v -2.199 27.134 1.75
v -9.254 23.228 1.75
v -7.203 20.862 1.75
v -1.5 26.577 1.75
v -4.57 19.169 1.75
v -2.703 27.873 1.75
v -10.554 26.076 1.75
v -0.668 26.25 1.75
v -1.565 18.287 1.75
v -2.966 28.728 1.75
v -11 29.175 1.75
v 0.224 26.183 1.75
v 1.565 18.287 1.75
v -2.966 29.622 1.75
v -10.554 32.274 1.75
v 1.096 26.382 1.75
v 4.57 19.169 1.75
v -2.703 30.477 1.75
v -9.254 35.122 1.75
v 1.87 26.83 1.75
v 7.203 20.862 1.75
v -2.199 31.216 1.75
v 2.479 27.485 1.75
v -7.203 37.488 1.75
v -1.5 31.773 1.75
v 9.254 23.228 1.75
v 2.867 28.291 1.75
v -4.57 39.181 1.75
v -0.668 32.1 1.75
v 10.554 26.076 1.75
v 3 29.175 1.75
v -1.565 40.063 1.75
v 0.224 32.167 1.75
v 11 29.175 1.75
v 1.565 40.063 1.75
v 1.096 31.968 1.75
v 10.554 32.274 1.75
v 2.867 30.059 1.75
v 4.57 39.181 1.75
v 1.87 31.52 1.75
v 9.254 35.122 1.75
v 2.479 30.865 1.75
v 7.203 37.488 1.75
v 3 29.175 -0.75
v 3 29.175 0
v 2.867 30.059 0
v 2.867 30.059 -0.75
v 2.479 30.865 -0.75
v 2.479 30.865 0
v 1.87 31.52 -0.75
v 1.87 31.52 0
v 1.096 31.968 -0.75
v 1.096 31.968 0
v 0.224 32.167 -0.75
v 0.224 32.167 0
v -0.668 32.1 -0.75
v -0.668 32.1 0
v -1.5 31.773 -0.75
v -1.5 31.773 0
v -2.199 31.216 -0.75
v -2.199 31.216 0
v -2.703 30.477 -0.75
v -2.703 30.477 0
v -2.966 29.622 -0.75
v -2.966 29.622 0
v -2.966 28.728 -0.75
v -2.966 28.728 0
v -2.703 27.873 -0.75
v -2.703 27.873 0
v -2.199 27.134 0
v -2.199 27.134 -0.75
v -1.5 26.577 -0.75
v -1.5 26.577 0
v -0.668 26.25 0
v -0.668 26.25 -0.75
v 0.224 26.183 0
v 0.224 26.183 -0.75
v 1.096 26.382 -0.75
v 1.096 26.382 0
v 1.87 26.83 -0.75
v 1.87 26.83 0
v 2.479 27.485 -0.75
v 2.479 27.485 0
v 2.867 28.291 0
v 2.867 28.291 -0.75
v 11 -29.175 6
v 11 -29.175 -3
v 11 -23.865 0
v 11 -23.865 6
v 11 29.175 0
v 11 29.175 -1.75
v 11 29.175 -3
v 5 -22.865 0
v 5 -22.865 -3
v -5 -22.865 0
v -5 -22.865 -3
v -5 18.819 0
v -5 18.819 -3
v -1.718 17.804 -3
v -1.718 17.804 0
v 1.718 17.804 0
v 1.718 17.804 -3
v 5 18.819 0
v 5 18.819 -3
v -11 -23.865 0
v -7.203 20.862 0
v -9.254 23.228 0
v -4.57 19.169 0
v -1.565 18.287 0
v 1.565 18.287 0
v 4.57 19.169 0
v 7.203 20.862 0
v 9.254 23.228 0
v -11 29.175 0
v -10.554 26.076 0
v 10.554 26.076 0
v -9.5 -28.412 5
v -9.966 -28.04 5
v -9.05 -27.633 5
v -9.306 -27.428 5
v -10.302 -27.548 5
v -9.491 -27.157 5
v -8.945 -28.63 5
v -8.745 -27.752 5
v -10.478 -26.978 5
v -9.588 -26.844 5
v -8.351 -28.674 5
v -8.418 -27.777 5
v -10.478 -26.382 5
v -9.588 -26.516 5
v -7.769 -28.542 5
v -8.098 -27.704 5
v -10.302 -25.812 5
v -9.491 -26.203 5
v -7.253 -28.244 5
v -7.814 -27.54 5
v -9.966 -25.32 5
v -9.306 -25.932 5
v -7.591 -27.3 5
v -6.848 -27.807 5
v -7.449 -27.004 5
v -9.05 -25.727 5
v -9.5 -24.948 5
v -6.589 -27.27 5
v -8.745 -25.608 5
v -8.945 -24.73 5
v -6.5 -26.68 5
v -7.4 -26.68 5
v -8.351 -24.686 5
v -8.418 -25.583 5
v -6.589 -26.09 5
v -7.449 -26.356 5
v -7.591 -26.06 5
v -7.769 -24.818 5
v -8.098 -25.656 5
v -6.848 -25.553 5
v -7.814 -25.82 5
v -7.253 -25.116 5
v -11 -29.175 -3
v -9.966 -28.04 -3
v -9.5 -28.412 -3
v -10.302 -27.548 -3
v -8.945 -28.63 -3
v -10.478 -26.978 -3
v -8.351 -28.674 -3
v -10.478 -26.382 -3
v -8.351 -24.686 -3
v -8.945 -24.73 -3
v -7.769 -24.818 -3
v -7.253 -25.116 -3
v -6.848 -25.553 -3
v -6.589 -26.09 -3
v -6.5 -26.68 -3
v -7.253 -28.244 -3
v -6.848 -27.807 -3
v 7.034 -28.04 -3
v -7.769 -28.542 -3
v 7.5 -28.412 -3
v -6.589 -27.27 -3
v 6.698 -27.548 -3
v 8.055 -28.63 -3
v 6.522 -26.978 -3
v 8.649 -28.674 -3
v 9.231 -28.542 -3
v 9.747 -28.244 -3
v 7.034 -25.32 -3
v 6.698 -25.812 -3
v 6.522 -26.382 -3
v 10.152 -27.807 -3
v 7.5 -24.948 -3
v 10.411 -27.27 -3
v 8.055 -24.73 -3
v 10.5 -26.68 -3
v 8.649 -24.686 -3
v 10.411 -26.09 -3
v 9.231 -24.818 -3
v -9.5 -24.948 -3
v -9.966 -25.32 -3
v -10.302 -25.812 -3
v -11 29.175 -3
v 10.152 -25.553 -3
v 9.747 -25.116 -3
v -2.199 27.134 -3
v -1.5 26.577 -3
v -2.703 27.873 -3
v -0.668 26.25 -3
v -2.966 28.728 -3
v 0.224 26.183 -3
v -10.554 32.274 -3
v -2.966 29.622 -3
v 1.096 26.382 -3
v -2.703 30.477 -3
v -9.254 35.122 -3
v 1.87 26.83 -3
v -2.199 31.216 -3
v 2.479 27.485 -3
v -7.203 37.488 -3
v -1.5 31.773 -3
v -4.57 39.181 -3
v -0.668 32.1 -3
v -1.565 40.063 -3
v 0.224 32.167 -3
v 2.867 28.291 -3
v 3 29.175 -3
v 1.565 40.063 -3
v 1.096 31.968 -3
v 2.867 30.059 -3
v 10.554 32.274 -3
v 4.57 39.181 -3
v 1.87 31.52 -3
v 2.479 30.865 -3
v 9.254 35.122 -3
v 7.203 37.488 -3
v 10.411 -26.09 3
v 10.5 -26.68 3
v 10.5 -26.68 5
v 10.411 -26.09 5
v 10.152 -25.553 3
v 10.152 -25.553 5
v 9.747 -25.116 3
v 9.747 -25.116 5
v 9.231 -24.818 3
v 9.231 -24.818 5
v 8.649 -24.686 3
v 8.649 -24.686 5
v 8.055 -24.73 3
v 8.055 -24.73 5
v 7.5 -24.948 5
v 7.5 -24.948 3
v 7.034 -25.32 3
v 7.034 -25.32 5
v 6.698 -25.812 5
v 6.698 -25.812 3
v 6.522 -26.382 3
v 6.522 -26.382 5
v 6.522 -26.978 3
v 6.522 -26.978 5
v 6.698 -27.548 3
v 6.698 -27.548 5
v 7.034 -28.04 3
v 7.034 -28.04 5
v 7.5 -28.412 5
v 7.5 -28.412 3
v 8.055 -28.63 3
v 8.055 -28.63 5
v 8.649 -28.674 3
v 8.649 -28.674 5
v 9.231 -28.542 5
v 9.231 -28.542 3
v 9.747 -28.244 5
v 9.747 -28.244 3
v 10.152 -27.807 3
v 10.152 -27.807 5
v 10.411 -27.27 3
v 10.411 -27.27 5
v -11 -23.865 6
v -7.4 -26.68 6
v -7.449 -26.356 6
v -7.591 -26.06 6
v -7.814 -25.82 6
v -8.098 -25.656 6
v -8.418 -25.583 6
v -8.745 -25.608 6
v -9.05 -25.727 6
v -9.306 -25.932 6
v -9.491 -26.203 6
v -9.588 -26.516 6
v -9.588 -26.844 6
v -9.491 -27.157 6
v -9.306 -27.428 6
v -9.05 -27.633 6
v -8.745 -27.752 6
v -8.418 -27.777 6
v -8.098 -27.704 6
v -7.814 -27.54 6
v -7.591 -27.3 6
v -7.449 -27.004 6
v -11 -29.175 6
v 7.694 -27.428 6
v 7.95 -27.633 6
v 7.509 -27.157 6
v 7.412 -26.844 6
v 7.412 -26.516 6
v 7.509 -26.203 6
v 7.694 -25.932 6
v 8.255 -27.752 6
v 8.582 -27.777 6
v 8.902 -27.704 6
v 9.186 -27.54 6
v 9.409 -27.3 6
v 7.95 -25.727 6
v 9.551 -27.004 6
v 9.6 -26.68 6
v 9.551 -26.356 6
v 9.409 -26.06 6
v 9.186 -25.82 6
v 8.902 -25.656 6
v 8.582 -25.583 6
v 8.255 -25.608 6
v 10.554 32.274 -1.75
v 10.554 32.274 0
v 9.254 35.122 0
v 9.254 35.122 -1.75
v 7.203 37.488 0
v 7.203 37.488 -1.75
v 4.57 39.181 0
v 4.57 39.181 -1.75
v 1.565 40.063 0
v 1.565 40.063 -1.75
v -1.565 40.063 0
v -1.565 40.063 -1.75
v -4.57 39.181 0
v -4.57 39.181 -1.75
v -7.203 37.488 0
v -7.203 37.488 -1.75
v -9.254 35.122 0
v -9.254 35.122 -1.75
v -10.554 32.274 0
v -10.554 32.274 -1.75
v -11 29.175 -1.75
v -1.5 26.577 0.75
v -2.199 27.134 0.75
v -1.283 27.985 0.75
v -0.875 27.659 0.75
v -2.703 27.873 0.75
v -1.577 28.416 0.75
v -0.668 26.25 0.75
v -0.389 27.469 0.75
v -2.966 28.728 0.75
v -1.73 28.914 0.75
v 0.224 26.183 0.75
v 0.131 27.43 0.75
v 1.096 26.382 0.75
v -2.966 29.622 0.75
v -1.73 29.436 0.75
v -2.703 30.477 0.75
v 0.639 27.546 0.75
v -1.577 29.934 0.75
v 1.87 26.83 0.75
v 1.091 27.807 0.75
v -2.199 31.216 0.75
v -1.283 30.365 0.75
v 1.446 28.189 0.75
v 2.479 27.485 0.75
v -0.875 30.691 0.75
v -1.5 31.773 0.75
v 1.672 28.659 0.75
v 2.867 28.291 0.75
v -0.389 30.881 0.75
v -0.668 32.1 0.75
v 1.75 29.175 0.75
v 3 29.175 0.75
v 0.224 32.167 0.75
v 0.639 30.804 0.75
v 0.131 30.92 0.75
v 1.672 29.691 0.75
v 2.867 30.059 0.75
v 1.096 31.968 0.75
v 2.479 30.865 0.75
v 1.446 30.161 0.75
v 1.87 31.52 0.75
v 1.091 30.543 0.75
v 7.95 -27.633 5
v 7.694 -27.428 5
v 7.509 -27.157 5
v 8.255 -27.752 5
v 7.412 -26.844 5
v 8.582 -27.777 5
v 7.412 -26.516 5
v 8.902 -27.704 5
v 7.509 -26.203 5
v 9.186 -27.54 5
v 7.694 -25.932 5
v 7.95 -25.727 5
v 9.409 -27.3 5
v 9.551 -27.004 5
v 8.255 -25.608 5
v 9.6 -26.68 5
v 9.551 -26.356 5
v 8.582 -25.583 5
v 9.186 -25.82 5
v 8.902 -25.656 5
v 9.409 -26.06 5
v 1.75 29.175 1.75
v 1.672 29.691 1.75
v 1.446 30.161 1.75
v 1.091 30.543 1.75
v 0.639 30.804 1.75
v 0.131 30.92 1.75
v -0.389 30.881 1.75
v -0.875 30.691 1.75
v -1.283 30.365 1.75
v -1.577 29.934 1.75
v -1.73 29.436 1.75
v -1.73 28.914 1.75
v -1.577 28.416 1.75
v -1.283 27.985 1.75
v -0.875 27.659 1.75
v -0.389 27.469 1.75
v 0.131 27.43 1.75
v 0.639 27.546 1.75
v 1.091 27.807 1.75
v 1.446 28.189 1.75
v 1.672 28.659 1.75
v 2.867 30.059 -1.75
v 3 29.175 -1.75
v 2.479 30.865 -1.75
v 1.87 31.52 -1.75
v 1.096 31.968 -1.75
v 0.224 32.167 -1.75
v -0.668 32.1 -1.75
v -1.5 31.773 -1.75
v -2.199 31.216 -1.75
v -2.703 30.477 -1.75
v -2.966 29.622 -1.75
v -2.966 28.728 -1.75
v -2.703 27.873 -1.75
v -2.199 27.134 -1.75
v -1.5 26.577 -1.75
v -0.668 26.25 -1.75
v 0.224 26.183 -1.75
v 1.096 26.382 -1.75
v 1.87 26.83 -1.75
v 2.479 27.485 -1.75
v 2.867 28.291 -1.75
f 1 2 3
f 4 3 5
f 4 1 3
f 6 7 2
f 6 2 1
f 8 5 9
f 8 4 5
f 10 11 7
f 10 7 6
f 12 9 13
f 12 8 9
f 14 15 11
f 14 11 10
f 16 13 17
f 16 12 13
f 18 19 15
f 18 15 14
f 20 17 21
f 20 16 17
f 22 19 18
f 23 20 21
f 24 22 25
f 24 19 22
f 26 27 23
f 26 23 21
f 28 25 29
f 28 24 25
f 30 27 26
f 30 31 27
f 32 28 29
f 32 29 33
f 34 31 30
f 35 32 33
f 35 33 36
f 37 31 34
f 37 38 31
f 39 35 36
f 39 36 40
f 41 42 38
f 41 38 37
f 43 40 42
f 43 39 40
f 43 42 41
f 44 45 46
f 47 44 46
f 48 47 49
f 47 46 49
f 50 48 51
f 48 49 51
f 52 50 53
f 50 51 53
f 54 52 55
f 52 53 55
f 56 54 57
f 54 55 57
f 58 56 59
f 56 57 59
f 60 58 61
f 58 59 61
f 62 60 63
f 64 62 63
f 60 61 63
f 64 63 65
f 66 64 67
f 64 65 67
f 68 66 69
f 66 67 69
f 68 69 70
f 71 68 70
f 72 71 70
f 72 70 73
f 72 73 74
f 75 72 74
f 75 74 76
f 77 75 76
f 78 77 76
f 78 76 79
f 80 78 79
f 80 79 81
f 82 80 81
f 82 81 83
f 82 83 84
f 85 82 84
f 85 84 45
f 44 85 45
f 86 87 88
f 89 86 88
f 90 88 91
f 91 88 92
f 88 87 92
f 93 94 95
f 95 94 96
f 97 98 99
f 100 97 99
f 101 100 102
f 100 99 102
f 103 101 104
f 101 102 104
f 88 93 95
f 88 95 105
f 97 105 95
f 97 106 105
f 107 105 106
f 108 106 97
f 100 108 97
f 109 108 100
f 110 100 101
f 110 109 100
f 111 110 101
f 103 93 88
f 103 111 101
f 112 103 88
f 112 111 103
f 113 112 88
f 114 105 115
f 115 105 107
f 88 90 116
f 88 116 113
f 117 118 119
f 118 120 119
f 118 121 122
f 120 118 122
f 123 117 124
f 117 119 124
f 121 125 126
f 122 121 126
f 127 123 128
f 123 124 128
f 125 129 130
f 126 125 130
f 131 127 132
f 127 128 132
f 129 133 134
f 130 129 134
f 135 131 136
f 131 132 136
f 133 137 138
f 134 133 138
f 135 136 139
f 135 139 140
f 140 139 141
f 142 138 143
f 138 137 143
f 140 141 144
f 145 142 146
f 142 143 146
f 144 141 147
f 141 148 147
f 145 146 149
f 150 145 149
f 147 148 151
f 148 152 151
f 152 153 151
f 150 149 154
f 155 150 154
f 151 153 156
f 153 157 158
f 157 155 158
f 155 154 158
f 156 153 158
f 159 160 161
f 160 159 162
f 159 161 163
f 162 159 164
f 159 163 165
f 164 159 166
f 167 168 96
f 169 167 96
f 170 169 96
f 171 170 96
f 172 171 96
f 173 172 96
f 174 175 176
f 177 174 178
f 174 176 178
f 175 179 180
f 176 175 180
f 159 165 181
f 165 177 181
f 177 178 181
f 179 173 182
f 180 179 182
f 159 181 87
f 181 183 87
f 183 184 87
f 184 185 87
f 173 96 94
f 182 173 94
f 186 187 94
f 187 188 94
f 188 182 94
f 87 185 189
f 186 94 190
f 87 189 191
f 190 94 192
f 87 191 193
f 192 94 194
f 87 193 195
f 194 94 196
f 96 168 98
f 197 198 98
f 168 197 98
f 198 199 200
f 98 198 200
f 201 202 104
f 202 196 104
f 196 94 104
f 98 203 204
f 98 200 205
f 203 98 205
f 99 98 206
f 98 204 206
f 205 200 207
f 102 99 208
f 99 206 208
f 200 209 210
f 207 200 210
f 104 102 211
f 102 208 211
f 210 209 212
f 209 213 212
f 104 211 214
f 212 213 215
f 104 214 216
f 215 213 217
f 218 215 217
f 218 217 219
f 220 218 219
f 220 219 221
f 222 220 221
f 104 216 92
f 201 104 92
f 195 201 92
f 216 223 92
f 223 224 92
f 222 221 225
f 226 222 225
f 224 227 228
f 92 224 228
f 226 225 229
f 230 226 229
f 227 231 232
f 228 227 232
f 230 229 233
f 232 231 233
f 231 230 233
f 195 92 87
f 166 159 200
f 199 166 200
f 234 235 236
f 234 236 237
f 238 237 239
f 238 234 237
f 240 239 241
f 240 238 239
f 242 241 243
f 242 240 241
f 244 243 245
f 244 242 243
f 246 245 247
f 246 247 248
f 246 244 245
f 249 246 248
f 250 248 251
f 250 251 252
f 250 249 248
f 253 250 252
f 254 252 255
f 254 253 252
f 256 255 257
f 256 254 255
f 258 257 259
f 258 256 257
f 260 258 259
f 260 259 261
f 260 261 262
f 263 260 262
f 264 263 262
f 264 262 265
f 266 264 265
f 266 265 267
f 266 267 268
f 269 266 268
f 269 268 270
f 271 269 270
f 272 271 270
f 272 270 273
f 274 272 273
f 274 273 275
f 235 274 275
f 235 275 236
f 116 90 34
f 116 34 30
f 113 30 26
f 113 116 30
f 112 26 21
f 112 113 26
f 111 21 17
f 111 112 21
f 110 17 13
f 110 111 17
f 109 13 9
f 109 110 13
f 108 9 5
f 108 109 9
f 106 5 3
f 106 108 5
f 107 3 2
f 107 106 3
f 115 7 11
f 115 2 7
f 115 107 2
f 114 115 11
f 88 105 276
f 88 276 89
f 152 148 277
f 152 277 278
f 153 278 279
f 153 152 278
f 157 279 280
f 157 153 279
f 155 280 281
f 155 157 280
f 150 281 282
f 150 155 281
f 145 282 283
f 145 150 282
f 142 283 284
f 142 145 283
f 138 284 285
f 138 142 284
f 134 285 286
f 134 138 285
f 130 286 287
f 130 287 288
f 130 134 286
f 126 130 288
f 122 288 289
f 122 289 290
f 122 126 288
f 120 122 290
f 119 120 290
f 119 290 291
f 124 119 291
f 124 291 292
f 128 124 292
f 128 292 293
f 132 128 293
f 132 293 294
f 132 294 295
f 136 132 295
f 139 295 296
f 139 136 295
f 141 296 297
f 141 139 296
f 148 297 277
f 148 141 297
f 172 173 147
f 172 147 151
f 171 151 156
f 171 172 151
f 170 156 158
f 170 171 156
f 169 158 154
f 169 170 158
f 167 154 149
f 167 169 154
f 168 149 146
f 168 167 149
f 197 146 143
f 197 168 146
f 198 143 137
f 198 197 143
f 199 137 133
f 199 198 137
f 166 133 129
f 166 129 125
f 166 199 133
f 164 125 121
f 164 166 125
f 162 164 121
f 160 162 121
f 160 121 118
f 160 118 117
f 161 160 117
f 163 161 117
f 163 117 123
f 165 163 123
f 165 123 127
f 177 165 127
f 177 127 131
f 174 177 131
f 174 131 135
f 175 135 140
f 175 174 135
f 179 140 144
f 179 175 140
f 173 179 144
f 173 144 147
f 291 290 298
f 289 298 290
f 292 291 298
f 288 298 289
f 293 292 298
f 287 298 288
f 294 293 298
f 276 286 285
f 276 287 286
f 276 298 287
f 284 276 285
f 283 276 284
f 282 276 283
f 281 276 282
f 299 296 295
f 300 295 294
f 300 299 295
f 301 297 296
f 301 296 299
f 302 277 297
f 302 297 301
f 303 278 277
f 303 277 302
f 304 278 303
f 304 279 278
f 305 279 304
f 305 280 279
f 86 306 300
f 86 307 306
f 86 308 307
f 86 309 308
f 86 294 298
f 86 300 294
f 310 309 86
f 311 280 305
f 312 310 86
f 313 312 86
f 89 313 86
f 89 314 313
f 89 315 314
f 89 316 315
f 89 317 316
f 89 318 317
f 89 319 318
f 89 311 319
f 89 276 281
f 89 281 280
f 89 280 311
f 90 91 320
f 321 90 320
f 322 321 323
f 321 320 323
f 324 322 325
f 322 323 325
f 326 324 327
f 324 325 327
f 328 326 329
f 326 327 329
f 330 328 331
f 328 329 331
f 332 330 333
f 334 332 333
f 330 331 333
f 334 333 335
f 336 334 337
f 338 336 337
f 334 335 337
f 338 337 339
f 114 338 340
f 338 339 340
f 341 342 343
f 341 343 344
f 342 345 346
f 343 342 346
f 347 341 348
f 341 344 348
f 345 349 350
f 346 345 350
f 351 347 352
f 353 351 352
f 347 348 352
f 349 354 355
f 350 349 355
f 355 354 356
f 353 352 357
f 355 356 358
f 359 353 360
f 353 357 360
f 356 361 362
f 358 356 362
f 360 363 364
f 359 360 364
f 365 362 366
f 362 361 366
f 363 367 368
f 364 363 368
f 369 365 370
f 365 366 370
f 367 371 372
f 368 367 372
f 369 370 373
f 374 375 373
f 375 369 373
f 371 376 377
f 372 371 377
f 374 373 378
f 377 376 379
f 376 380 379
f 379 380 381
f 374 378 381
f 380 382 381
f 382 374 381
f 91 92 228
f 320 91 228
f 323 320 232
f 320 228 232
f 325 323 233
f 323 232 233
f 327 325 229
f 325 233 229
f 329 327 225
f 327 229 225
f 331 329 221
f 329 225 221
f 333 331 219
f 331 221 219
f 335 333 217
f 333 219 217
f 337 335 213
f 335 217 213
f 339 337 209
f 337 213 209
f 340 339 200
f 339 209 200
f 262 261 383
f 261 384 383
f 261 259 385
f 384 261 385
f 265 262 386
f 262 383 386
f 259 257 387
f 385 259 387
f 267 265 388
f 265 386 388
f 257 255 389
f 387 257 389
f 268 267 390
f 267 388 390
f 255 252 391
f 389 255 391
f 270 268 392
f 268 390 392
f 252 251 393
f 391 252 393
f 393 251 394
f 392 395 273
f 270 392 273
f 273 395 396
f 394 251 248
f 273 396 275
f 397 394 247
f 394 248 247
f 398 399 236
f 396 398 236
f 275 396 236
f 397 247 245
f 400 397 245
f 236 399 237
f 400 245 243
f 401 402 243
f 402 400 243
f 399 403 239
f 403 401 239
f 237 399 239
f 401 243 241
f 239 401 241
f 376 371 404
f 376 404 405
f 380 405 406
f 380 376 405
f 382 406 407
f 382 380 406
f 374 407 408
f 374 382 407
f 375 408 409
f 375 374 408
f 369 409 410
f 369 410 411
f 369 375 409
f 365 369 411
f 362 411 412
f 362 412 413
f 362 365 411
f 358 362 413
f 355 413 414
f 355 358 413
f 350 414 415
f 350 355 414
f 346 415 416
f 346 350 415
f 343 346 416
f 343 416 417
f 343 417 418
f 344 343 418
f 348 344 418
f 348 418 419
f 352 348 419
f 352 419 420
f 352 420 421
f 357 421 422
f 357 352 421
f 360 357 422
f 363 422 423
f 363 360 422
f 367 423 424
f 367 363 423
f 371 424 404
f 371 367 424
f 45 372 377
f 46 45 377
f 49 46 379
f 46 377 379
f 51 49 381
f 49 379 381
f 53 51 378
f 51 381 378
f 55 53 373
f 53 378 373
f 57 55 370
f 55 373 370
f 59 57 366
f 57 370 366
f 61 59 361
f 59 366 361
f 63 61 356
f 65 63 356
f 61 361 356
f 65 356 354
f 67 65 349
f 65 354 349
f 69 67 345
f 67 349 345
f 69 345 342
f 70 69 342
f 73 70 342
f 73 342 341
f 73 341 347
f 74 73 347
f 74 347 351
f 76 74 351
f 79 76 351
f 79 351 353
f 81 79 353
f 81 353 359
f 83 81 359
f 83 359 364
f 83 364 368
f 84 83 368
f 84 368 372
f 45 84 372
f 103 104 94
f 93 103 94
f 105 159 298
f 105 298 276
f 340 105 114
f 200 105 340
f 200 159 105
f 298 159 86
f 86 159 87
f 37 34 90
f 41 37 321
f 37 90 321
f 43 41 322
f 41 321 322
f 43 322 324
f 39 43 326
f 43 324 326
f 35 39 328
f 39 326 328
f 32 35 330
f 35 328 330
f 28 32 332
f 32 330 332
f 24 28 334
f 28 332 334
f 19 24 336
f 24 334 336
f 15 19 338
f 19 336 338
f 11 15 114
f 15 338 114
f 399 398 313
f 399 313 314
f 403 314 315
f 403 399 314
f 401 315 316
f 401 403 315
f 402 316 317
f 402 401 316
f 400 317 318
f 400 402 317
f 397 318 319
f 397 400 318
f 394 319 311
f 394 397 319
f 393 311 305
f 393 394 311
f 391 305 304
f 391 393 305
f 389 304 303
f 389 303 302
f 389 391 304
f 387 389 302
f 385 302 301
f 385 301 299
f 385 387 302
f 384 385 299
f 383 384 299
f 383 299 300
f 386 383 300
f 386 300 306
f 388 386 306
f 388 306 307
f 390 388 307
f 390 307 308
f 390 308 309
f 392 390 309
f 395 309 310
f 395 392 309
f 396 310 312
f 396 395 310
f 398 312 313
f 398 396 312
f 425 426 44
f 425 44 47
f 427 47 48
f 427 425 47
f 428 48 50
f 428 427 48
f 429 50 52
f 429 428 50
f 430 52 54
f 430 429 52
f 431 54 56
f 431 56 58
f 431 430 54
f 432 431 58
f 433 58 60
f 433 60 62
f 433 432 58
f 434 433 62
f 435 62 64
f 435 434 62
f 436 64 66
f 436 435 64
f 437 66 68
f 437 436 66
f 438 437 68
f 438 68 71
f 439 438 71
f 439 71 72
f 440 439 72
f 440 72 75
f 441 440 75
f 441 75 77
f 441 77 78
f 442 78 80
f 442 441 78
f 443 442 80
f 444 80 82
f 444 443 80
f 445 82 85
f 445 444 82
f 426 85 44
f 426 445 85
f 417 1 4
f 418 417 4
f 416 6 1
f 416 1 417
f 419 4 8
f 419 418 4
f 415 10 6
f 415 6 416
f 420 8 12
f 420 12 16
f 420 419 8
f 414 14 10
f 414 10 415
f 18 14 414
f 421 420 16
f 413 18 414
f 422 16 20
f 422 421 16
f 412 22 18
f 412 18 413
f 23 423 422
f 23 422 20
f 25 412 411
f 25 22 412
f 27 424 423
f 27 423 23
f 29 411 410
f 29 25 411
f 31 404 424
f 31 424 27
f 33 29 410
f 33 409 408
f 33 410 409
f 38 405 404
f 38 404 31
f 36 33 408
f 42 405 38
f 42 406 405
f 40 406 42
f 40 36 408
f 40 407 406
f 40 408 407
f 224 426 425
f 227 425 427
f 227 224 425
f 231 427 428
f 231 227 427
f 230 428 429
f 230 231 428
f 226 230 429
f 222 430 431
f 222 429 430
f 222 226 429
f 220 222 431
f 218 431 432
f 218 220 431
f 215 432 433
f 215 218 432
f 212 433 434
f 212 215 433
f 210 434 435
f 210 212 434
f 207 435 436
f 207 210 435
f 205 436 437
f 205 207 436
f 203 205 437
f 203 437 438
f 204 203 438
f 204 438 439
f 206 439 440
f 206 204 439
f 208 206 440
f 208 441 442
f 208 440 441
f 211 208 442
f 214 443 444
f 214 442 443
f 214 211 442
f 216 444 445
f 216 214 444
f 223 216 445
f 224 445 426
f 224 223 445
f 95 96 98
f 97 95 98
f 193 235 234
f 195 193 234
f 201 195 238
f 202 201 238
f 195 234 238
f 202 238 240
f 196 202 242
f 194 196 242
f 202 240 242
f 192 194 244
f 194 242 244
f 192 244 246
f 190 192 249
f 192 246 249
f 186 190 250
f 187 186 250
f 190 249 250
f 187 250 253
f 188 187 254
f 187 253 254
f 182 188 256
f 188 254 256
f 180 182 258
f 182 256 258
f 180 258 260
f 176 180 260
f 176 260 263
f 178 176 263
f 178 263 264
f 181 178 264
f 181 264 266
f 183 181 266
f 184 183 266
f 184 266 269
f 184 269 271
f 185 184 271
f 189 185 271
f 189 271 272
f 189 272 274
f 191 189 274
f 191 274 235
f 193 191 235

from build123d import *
from build123d.topology import SkipClean

# Parameters (mm, degrees)
BOSS_EXTRUDE1_DEPTH           = 3
BOSS_EXTRUDE2_START           = -1.75
SKETCH1_3_R                   = 11
BOSS_EXTRUDE2_DEPTH           = 1.75
SKETCH2_R                     = 1.75
CUT_EXTRUDE1_DEPTH            = 4.75
SKETCH2_3_R                   = 3
CUT_EXTRUDE2_DEPTH            = 3.75
SKETCH1_6_W                   = 11
SKETCH1_6_H                   = 5.31
BOSS_EXTRUDE3_DEPTH           = 6
SKETCH3_R                     = 1.1
CUT_EXTRUDE3_DEPTH            = 9
SKETCH3_3_R                   = 2
SKETCH3_3_R_2                 = 1.1
CUT_EXTRUDE4_DEPTH            = 8
BODY_MOVE_COPY1_START         = -3
BODY_MOVE_COPY1_OUTLINE_R     = 3
BODY_MOVE_COPY1_DEPTH         = 3
BODY_MOVE_COPY1_START_2       = 3
BODY_MOVE_COPY1_2_OUTLINE_W   = 22
BODY_MOVE_COPY1_2_OUTLINE_H   = 5.31
BODY_MOVE_COPY1_2_OUTLINE_R   = 2
BODY_MOVE_COPY1_2_DEPTH       = 3
BODY_MOVE_COPY1_START_3       = 0.75
BODY_MOVE_COPY1_3_OUTLINE_R   = 3
BODY_MOVE_COPY1_3_OUTLINE_R_2 = 1.75
BODY_MOVE_COPY1_3_DEPTH       = 1
BODY_MOVE_COPY1_START_4       = 5
BODY_MOVE_COPY1_4_OUTLINE_R   = 2
BODY_MOVE_COPY1_4_OUTLINE_R_2 = 1.1
BODY_MOVE_COPY1_4_DEPTH       = 1
BODY_MOVE_COPY1_5_DEPTH       = 3
BODY_MOVE_COPY1_START_5       = 1.75
BODY_MOVE_COPY1_6_OUTLINE_R   = 11
BODY_MOVE_COPY1_6_OUTLINE_R_2 = 3
BODY_MOVE_COPY1_6_DEPTH       = 1.25
BODY_MOVE_COPY1_START_6       = -6
BODY_MOVE_COPY1_7_OUTLINE_W   = 22
BODY_MOVE_COPY1_7_OUTLINE_H   = 5.31
BODY_MOVE_COPY1_7_OUTLINE_R   = 1.1
BODY_MOVE_COPY1_7_DEPTH       = 3
BODY_MOVE_COPY1_START_7       = -1.75
BODY_MOVE_COPY1_8_OUTLINE_R   = 3
BODY_MOVE_COPY1_8_OUTLINE_R_2 = 1.75
BODY_MOVE_COPY1_8_DEPTH       = 1


# Read off the part's stored shape, not the designer's step: Body-Move/Copy1
with BuildPart() as part:
    # Sketch1 → Boss-Extrude1 (new body)
    with BuildSketch(Plane.XY):
        with BuildLine():
            Line((-11, 29.175), (-11, -29.175))
            Line((-11, -29.175), (11, -29.175))
            Line((11, -29.175), (11, 29.175))
            ThreePointArc((11, 29.175), (0, 40.175), (-11, 29.175))
        make_face()
        with BuildLine():
            Line((5, -22.865), (-5, -22.865))
            Line((-5, -22.865), (-5, 18.818842411))
            ThreePointArc((-5, 18.818842411), (0, 17.675), (5, 18.818842411))
            Line((5, 18.818842411), (5, -22.865))
        make_face(mode=Mode.SUBTRACT)
    extrude(amount=BOSS_EXTRUDE1_DEPTH)

    # Sketch1<3> → Boss-Extrude2 (add)
    with BuildSketch(Plane.XY.offset(BOSS_EXTRUDE2_START)):
        with Locations((0, 29.175)):
            Circle(SKETCH1_3_R)
    extrude(amount=BOSS_EXTRUDE2_DEPTH)

    # Sketch2 → Cut-Extrude1 (cut)
    with BuildSketch(Plane.XY.offset(3)):
        with Locations((0, 29.175)):
            Circle(SKETCH2_R)
    extrude(amount=-CUT_EXTRUDE1_DEPTH, mode=Mode.SUBTRACT)

    # Sketch2<3> → Cut-Extrude2 (cut)
    with BuildSketch(Plane.XY.offset(3)):
        with Locations((0, 29.175)):
            Circle(SKETCH2_3_R)
    extrude(amount=-CUT_EXTRUDE2_DEPTH, mode=Mode.SUBTRACT)

    # Sketch1<6> → Boss-Extrude3 (add)
    with BuildSketch(Plane.XY):
        with Locations((5.5, -26.52)):
            Rectangle(SKETCH1_6_W, SKETCH1_6_H)
        with Locations((-5.5, -26.52)):
            Rectangle(SKETCH1_6_W, SKETCH1_6_H)
    extrude(amount=-BOSS_EXTRUDE3_DEPTH)

    # Sketch3 → Cut-Extrude3 (cut)
    with BuildSketch(Plane.XY.offset(3)):
        with Locations((-8.5, -26.67999607)):
            Circle(SKETCH3_R)
        with Locations((8.5, -26.67999607)):
            Circle(SKETCH3_R)
    extrude(amount=-CUT_EXTRUDE3_DEPTH, mode=Mode.SUBTRACT)

    # Sketch3<3> → Cut-Extrude4 (cut)
    # profile 1 of 2: a face of its own
    with BuildSketch(Plane.XY.offset(3)):
        with Locations((-8.5, -26.67999607)):
            Circle(SKETCH3_3_R)
        with Locations((-8.5, -26.67999607)):
            Circle(SKETCH3_3_R_2, mode=Mode.SUBTRACT)
    # profile 2 of 2: a face of its own
    with BuildSketch(Plane.XY.offset(3)):
        with Locations((8.5, -26.67999607)):
            Circle(SKETCH3_3_R)
        with Locations((8.5, -26.67999607)):
            Circle(SKETCH3_3_R_2, mode=Mode.SUBTRACT)
    extrude(amount=-CUT_EXTRUDE4_DEPTH, mode=Mode.SUBTRACT)

    # Body-Move/Copy1 outline → Body-Move/Copy1 (add)
    with BuildSketch(Plane.XY.offset(BODY_MOVE_COPY1_START)):
        with BuildLine():
            Line((-11, 29.175), (-11, -23.865))
            Line((-11, -23.865), (11, -23.865))
            Line((11, -23.865), (11, 29.175))
            ThreePointArc((11, 29.175), (0, 40.175), (-11, 29.175))
        make_face()
        with BuildLine():
            Line((-5, -22.865), (-5, 18.818842411))
            ThreePointArc((-5, 18.818842411), (0, 17.675), (5, 18.818842411))
            Line((5, 18.818842411), (5, -22.865))
            Line((5, -22.865), (-5, -22.865))
        make_face(mode=Mode.SUBTRACT)
        with Locations((0, 29.175)):
            Circle(BODY_MOVE_COPY1_OUTLINE_R, mode=Mode.SUBTRACT)
    extrude(amount=BODY_MOVE_COPY1_DEPTH)

    # Body-Move_Copy1 2 outline → Body-Move_Copy1 2 (add)
    with BuildSketch(Plane.XY.offset(BODY_MOVE_COPY1_START_2)):
        with Locations((0, -26.52)):
            Rectangle(BODY_MOVE_COPY1_2_OUTLINE_W, BODY_MOVE_COPY1_2_OUTLINE_H)
        with Locations((-8.5, -26.67999607)):
            Circle(BODY_MOVE_COPY1_2_OUTLINE_R, mode=Mode.SUBTRACT)
        with Locations((8.5, -26.67999607)):
            Circle(BODY_MOVE_COPY1_2_OUTLINE_R, mode=Mode.SUBTRACT)
    extrude(amount=BODY_MOVE_COPY1_2_DEPTH)

    # Body-Move_Copy1 3 outline → Body-Move_Copy1 3 (add)
    with BuildSketch(Plane.XY.offset(BODY_MOVE_COPY1_START_3)):
        with Locations((0, 29.175)):
            Circle(BODY_MOVE_COPY1_3_OUTLINE_R)
        with Locations((0, 29.175)):
            Circle(BODY_MOVE_COPY1_3_OUTLINE_R_2, mode=Mode.SUBTRACT)
    extrude(amount=BODY_MOVE_COPY1_3_DEPTH)

    # Body-Move_Copy1 4 outline → Body-Move_Copy1 4 (add)
    # profile 1 of 2: a face of its own
    with BuildSketch(Plane.XY.offset(BODY_MOVE_COPY1_START_4)):
        with Locations((-8.5, -26.67999607)):
            Circle(BODY_MOVE_COPY1_4_OUTLINE_R)
        with Locations((-8.5, -26.67999607)):
            Circle(BODY_MOVE_COPY1_4_OUTLINE_R_2, mode=Mode.SUBTRACT)
    # profile 2 of 2: a face of its own
    with BuildSketch(Plane.XY.offset(BODY_MOVE_COPY1_START_4)):
        with Locations((8.5, -26.67999607)):
            Circle(BODY_MOVE_COPY1_4_OUTLINE_R)
        with Locations((8.5, -26.67999607)):
            Circle(BODY_MOVE_COPY1_4_OUTLINE_R_2, mode=Mode.SUBTRACT)
    extrude(amount=BODY_MOVE_COPY1_4_DEPTH)

    # Body-Move_Copy1 5 outline → Body-Move_Copy1 5 (cut)
    with SkipClean():  # the faces are left unmerged after this step: merging them gives an invalid solid
        with BuildSketch(Plane.XY):
            with BuildLine():
                Line((-11, 29.175), (-11, -23.865))
                Line((-11, -23.865), (11, -23.865))
                Line((11, -23.865), (11, 29.175))
                ThreePointArc((11, 29.175), (0, 18.175), (-11, 29.175))
            make_face()
            with BuildLine():
                Line((-5, -22.865), (-5, 18.818842411))
                ThreePointArc((-5, 18.818842411), (0, 17.675), (5, 18.818842411))
                Line((5, 18.818842411), (5, -22.865))
                Line((5, -22.865), (-5, -22.865))
            make_face(mode=Mode.SUBTRACT)
        extrude(amount=BODY_MOVE_COPY1_5_DEPTH, mode=Mode.SUBTRACT)

    # Body-Move_Copy1 6 outline → Body-Move_Copy1 6 (cut)
    with BuildSketch(Plane.XY.offset(BODY_MOVE_COPY1_START_5)):
        with Locations((0, 29.175)):
            Circle(BODY_MOVE_COPY1_6_OUTLINE_R)
        with Locations((0, 29.175)):
            Circle(BODY_MOVE_COPY1_6_OUTLINE_R_2, mode=Mode.SUBTRACT)
    extrude(amount=BODY_MOVE_COPY1_6_DEPTH, mode=Mode.SUBTRACT)

    # Body-Move_Copy1 7 outline → Body-Move_Copy1 7 (cut)
    with BuildSketch(Plane.XY.offset(BODY_MOVE_COPY1_START_6)):
        with Locations((0, -26.52)):
            Rectangle(BODY_MOVE_COPY1_7_OUTLINE_W, BODY_MOVE_COPY1_7_OUTLINE_H)
        with Locations((-8.5, -26.67999607)):
            Circle(BODY_MOVE_COPY1_7_OUTLINE_R, mode=Mode.SUBTRACT)
        with Locations((8.5, -26.67999607)):
            Circle(BODY_MOVE_COPY1_7_OUTLINE_R, mode=Mode.SUBTRACT)
    extrude(amount=BODY_MOVE_COPY1_7_DEPTH, mode=Mode.SUBTRACT)

    # Body-Move_Copy1 8 outline → Body-Move_Copy1 8 (cut)
    with SkipClean():  # the faces are left unmerged after this step: merging them gives an invalid solid
        with BuildSketch(Plane.XY.offset(BODY_MOVE_COPY1_START_7)):
            with Locations((0, 29.175)):
                Circle(BODY_MOVE_COPY1_8_OUTLINE_R)
            with Locations((0, 29.175)):
                Circle(BODY_MOVE_COPY1_8_OUTLINE_R_2, mode=Mode.SUBTRACT)
        extrude(amount=BODY_MOVE_COPY1_8_DEPTH, mode=Mode.SUBTRACT)
    add(part.part.scale(1), mode=Mode.REPLACE)  # the faces are merged on a copy


solid = part.part
